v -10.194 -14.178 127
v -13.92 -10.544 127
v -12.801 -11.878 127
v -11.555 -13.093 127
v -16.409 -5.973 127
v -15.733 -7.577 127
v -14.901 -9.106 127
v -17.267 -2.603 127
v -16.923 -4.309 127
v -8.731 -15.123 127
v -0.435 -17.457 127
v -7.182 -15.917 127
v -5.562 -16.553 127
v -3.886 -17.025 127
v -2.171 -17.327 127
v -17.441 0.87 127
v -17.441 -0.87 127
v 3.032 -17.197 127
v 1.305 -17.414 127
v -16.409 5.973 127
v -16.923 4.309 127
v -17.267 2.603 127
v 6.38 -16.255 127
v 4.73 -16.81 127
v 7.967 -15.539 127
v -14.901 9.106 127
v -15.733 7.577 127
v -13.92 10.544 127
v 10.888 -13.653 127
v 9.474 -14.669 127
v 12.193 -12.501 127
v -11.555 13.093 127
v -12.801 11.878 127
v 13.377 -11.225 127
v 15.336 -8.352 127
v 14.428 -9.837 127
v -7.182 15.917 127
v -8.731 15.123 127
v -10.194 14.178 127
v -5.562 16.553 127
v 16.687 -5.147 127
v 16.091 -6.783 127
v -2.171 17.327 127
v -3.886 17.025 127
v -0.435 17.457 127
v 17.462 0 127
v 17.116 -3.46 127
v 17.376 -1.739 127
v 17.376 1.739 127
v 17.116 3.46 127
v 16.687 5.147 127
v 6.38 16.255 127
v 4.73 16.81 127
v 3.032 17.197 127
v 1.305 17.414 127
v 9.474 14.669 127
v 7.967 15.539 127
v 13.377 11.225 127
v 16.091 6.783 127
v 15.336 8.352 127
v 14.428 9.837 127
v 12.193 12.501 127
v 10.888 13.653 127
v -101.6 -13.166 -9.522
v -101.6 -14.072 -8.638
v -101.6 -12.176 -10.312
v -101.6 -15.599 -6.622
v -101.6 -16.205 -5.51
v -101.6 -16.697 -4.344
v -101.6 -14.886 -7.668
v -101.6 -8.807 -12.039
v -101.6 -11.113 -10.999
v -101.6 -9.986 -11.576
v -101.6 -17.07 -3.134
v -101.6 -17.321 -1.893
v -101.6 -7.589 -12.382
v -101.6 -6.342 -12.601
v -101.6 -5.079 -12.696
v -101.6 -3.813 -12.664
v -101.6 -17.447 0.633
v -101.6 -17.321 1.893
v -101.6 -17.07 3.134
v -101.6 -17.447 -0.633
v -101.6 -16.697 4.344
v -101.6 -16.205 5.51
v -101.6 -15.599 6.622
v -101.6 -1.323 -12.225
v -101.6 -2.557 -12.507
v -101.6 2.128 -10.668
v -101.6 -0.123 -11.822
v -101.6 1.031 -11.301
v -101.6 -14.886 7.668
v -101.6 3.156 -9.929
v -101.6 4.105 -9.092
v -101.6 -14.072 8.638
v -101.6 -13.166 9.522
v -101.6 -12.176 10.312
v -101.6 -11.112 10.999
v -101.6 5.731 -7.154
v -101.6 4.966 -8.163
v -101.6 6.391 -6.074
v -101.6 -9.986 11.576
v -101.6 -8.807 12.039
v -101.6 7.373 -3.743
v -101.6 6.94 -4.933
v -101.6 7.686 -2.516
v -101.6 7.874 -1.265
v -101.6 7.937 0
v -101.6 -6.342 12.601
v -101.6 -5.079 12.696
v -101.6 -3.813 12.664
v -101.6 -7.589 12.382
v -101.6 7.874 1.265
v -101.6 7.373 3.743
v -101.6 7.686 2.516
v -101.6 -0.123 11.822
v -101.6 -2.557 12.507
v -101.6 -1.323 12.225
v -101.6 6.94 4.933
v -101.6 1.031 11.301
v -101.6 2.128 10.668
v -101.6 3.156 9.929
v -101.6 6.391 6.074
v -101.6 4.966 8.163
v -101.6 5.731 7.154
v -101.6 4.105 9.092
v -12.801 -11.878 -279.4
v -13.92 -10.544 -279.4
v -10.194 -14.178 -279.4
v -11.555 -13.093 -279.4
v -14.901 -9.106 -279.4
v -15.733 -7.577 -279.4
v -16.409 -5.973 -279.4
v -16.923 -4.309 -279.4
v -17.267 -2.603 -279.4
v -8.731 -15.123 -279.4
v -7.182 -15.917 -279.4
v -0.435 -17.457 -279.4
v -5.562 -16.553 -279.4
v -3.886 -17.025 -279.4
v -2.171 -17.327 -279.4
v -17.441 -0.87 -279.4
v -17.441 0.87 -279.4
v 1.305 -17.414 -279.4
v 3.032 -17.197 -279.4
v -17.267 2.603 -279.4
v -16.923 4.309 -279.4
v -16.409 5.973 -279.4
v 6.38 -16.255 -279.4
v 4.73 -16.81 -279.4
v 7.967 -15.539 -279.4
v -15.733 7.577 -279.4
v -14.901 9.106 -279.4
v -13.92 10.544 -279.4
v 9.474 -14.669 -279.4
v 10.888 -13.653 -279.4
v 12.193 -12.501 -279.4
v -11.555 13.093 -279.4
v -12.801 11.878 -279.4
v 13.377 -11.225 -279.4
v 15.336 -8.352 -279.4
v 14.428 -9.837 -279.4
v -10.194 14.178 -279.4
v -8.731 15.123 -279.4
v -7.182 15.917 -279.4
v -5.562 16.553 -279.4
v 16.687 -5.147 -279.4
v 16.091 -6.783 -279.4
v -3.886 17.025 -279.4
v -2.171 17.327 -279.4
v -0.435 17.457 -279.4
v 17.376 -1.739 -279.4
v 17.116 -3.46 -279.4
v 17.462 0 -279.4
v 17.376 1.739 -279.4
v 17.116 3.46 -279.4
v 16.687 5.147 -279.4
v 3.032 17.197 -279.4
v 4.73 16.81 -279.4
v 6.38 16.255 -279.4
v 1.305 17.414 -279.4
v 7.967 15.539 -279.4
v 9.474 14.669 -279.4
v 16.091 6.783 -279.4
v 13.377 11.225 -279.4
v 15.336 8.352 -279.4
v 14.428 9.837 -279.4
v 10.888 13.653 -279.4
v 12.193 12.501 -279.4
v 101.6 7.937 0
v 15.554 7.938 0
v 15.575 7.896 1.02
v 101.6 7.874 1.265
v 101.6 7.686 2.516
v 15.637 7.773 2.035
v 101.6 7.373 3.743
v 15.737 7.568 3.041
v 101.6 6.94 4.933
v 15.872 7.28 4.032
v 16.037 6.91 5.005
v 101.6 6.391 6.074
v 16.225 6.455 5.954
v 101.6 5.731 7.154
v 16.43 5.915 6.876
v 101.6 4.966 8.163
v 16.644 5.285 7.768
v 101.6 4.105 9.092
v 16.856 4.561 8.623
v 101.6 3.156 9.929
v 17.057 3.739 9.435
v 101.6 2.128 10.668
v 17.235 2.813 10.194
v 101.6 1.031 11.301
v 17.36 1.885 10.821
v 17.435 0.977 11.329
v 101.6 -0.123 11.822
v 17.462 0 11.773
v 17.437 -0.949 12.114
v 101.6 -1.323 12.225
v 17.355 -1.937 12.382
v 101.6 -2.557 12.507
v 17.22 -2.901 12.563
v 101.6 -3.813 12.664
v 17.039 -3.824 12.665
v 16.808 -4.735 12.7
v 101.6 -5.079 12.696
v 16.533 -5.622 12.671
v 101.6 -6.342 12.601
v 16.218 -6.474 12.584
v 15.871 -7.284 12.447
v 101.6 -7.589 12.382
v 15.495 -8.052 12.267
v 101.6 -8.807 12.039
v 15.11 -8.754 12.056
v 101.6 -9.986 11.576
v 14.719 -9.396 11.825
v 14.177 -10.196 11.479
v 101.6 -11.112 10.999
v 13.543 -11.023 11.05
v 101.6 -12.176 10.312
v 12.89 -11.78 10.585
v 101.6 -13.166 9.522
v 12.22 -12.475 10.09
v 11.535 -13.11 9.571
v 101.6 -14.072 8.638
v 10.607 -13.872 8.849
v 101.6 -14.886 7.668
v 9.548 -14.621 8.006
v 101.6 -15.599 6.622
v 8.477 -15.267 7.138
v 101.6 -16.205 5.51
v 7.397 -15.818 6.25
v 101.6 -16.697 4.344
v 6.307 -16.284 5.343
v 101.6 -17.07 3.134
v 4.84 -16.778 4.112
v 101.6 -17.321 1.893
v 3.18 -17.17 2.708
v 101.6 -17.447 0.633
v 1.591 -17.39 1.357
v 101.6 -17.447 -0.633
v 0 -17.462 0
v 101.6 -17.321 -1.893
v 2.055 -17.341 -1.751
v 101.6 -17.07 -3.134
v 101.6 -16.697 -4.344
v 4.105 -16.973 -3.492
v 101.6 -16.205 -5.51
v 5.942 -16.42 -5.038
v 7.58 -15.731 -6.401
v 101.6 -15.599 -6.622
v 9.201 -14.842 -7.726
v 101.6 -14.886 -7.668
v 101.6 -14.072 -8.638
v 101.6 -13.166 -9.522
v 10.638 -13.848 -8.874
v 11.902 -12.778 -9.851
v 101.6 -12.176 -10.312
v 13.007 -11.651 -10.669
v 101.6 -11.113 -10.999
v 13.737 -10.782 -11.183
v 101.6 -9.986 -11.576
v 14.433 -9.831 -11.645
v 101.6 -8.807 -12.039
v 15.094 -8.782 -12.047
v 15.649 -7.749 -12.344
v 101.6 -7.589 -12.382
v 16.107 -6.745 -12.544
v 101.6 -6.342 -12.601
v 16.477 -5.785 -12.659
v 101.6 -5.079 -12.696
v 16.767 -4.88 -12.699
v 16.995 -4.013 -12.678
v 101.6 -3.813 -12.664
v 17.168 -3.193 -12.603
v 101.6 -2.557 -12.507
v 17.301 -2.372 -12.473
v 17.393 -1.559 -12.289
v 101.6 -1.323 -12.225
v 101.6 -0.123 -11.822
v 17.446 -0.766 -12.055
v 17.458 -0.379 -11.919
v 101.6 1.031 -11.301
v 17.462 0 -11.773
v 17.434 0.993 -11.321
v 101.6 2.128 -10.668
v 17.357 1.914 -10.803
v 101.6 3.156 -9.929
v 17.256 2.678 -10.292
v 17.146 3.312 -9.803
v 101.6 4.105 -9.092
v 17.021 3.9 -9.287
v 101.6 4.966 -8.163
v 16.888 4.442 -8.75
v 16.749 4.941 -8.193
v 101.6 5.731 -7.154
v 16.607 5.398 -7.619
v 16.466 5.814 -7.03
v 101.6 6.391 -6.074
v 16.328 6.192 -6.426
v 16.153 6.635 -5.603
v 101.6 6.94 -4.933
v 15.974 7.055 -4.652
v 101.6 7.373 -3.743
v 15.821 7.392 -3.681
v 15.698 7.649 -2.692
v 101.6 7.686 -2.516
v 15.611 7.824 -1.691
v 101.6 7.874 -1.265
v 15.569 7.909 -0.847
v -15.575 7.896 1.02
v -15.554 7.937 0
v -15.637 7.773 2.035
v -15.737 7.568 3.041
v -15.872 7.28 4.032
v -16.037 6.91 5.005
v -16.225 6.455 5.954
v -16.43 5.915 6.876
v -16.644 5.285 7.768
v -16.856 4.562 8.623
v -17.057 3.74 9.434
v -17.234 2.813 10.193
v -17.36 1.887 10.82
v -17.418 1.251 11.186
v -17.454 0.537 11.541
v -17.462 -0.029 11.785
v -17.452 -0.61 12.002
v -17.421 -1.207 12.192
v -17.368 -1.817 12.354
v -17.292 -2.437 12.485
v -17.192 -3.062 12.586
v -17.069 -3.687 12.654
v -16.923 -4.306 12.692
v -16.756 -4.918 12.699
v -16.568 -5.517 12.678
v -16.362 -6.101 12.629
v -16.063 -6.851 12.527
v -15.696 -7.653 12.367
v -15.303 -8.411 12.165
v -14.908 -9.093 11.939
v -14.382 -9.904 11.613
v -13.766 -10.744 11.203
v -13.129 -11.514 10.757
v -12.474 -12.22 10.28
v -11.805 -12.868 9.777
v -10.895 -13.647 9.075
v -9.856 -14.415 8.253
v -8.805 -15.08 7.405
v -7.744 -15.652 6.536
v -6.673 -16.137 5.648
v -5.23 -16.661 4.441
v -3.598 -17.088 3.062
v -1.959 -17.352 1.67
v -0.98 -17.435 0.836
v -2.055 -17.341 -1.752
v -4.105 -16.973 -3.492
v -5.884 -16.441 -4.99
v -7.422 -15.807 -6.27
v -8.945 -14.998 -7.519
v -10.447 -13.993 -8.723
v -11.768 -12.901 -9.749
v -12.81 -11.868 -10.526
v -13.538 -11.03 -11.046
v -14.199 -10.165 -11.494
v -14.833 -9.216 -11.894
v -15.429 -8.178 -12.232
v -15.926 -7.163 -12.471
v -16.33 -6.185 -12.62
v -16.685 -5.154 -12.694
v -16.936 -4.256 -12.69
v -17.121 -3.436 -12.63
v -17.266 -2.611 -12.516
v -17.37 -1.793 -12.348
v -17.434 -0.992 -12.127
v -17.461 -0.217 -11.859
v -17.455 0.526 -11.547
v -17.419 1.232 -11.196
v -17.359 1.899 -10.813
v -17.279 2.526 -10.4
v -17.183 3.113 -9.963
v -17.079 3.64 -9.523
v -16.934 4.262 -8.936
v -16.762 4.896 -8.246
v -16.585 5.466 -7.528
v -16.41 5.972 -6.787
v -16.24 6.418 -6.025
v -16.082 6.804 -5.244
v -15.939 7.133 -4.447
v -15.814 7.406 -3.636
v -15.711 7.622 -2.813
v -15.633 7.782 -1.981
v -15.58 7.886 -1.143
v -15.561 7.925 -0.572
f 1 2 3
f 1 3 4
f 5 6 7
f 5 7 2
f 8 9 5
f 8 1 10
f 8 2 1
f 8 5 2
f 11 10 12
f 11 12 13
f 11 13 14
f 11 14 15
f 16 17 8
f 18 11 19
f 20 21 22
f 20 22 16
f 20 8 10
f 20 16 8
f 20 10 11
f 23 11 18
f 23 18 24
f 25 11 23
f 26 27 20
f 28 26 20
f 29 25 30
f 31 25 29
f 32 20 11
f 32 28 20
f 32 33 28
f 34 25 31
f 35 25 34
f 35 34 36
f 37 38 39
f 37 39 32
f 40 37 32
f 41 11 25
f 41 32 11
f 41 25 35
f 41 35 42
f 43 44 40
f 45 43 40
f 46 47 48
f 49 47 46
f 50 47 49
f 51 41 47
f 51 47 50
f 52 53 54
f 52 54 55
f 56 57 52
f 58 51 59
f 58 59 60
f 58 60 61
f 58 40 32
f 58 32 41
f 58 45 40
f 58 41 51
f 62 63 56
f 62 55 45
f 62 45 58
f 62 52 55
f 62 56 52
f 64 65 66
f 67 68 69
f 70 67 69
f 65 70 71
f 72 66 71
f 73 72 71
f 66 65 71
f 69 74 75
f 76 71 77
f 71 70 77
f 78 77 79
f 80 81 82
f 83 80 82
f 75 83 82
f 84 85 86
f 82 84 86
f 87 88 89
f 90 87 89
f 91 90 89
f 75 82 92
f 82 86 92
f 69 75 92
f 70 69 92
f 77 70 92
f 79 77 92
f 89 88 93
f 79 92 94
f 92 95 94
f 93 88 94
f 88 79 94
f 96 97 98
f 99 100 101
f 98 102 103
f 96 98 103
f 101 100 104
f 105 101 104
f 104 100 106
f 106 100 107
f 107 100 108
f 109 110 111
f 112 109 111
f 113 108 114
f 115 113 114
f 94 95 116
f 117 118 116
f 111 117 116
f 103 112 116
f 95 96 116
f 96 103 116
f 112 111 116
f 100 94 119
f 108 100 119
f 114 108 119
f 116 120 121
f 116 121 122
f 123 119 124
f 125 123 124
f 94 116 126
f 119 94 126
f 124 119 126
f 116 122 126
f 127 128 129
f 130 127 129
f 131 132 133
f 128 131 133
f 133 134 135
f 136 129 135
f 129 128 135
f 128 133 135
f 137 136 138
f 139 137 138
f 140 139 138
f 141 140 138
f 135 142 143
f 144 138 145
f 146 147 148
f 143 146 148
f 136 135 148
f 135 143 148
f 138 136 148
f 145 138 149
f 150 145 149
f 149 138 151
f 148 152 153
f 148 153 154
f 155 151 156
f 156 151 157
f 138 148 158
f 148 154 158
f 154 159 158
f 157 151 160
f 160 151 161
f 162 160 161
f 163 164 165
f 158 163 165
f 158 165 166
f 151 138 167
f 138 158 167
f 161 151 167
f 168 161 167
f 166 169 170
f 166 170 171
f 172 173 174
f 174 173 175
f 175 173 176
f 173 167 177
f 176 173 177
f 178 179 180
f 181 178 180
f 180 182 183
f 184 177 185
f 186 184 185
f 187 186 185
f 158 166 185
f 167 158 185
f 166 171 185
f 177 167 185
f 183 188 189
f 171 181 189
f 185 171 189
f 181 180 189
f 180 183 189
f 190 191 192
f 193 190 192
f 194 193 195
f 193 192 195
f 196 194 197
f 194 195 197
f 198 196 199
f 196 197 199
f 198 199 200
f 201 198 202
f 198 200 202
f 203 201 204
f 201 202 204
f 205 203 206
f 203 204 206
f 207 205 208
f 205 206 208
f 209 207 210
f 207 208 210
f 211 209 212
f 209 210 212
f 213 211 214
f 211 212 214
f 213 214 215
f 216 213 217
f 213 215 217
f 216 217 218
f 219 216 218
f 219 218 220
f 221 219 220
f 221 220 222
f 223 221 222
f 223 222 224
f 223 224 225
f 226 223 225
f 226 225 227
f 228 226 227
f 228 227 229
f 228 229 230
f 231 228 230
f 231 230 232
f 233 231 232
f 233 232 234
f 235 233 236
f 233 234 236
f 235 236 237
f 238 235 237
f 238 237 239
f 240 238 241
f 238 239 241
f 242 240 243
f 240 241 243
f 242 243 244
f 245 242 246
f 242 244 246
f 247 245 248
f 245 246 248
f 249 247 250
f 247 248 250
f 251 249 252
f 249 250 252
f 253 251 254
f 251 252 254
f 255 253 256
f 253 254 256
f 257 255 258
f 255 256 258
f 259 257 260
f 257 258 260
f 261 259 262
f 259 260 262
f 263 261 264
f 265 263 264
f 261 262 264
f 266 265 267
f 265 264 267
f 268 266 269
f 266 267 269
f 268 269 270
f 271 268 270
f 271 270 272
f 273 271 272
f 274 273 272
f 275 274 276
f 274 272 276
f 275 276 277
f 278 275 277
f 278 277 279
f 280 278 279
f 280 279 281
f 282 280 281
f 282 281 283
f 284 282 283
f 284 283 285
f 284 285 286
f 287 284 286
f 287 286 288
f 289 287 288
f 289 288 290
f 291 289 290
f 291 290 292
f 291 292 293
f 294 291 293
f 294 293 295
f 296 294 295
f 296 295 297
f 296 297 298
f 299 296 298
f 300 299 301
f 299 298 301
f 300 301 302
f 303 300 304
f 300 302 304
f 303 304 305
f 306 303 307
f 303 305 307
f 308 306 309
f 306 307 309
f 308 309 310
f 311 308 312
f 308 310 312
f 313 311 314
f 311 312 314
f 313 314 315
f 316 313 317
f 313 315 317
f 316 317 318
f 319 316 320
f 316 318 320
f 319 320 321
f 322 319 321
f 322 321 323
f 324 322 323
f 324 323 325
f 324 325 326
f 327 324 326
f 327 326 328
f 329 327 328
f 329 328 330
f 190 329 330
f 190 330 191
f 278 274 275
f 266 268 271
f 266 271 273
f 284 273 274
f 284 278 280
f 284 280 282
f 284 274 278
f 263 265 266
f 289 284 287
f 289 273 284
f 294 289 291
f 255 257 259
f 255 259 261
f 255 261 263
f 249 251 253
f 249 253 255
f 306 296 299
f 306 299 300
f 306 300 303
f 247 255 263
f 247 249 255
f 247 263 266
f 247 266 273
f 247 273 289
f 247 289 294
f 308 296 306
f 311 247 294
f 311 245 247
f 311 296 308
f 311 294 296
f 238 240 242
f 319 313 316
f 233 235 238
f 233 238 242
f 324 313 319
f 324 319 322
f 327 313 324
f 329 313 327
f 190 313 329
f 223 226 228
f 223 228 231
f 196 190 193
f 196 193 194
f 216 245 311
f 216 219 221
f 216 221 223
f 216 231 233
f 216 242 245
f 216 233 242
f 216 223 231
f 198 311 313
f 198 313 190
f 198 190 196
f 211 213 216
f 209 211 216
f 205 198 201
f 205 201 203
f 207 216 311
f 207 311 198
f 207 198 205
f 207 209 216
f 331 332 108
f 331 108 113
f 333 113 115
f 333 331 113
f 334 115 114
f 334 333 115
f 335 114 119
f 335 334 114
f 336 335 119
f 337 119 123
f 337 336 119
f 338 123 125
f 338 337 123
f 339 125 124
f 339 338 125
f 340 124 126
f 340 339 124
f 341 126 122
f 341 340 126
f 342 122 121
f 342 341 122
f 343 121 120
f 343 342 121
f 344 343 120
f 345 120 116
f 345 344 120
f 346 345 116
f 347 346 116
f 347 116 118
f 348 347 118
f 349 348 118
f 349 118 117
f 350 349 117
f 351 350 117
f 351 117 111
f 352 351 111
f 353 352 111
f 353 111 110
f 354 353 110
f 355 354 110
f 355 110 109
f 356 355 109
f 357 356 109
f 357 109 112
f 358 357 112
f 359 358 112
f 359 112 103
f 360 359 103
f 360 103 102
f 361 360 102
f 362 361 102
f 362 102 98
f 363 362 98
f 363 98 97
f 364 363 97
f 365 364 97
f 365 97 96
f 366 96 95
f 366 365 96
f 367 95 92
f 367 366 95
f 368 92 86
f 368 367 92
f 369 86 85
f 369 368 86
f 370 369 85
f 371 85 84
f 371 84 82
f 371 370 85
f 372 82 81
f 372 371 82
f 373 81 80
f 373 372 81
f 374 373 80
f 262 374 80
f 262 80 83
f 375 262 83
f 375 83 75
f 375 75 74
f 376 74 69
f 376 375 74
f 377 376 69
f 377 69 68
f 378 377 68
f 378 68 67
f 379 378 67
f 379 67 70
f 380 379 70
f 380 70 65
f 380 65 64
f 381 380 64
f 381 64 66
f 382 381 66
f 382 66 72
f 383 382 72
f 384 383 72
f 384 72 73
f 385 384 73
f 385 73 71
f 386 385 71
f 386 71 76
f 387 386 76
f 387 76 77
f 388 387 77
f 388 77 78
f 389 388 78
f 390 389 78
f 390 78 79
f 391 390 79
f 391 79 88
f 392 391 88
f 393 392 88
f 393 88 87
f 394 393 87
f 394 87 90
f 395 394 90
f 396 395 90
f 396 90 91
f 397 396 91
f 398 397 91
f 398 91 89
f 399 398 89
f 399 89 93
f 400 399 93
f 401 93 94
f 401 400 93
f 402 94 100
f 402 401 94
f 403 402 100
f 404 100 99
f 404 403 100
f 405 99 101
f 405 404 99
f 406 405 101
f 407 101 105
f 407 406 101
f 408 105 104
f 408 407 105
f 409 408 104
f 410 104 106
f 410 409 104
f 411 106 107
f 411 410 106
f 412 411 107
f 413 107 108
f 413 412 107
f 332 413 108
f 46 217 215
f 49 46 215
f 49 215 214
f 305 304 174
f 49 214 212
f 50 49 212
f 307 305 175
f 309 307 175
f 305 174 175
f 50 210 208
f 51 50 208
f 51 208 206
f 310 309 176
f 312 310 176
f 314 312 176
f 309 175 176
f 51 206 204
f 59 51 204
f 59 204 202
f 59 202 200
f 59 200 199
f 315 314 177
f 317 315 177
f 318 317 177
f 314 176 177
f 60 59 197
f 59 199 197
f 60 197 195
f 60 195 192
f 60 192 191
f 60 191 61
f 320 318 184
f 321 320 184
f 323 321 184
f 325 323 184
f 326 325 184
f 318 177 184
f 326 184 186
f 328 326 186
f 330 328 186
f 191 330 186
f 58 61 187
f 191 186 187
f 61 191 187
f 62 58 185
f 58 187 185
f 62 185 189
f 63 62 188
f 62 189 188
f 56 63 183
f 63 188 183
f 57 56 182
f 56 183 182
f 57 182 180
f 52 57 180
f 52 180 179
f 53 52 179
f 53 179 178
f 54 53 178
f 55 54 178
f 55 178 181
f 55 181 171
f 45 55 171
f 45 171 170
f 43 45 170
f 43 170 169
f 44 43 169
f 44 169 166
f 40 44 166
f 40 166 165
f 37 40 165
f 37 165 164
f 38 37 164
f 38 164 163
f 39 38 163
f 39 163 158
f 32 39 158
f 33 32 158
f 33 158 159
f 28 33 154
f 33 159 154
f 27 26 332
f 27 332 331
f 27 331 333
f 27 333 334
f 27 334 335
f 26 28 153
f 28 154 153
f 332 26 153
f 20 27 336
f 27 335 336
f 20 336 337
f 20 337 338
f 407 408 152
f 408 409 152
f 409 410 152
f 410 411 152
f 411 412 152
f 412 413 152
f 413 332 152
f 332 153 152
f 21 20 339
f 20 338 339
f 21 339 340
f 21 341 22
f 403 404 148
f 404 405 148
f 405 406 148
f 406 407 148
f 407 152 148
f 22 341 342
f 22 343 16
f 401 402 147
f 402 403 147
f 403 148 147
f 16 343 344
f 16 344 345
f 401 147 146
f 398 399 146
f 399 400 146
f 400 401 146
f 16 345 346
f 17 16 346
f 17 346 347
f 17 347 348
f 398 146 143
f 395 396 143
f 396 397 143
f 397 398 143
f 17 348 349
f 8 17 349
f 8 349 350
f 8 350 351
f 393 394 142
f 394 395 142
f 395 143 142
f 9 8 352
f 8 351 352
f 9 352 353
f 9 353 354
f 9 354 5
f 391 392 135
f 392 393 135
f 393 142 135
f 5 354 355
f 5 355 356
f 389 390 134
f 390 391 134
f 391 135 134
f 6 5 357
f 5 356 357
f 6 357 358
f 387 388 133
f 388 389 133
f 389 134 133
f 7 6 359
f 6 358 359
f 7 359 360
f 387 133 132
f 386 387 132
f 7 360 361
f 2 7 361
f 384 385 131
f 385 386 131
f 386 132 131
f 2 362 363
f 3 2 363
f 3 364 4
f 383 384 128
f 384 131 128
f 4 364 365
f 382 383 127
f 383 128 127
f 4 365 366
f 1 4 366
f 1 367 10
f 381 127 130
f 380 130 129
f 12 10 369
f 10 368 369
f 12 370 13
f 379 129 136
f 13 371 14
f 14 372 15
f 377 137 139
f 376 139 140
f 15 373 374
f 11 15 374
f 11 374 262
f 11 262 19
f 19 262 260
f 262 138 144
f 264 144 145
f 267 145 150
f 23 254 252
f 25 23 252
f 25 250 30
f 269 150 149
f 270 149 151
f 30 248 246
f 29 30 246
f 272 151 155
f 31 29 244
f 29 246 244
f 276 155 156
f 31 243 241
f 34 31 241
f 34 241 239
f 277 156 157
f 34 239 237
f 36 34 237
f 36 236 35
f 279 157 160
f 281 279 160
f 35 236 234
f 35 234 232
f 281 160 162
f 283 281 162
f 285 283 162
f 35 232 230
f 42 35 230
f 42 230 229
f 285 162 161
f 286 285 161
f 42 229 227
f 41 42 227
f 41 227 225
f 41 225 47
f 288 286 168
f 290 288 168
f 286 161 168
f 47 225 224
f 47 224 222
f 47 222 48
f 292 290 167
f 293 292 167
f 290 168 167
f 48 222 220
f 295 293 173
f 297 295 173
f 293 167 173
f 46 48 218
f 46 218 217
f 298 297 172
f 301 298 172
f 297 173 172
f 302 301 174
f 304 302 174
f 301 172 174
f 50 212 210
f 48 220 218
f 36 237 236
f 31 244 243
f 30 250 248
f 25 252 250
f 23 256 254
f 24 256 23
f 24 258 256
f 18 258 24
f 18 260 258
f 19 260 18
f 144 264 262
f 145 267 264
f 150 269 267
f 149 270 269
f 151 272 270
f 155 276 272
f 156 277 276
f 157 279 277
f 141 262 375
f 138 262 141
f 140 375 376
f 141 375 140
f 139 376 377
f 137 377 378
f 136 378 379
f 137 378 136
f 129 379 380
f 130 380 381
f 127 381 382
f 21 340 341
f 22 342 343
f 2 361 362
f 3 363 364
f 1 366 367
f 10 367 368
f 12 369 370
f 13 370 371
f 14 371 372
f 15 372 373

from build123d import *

# Parameters (mm, degrees)
F0_R      = 17.4625
F1_DEPTH  = 279.4
F1_FACE_R = 17.4625
F2_DEPTH  = 127
F3_R      = 12.7
F4_DEPTH  = 101.6
F5_DEPTH  = 101.6


with BuildPart() as f1:
    # F0 (on Top) → F1 (new body)
    with BuildSketch(Plane.XY):
        Circle(F0_R)
    extrude(amount=-F1_DEPTH)

    # F1_face (on face) → F2 (join)
    with BuildSketch(Plane.XY):
        Circle(F1_FACE_R)
    extrude(amount=F2_DEPTH)

    # F3 (on Right) → F4 (join)
    with BuildSketch(Plane.YZ):
        with Locations((-4.7625, 0)):
            Circle(F3_R)
    extrude(amount=F4_DEPTH)

    # F3 (on Right) → F5 (join)
    with BuildSketch(Plane.YZ):
        with Locations((-4.7625, 0)):
            Circle(F3_R)
    extrude(amount=-F5_DEPTH)


solid = f1.part
